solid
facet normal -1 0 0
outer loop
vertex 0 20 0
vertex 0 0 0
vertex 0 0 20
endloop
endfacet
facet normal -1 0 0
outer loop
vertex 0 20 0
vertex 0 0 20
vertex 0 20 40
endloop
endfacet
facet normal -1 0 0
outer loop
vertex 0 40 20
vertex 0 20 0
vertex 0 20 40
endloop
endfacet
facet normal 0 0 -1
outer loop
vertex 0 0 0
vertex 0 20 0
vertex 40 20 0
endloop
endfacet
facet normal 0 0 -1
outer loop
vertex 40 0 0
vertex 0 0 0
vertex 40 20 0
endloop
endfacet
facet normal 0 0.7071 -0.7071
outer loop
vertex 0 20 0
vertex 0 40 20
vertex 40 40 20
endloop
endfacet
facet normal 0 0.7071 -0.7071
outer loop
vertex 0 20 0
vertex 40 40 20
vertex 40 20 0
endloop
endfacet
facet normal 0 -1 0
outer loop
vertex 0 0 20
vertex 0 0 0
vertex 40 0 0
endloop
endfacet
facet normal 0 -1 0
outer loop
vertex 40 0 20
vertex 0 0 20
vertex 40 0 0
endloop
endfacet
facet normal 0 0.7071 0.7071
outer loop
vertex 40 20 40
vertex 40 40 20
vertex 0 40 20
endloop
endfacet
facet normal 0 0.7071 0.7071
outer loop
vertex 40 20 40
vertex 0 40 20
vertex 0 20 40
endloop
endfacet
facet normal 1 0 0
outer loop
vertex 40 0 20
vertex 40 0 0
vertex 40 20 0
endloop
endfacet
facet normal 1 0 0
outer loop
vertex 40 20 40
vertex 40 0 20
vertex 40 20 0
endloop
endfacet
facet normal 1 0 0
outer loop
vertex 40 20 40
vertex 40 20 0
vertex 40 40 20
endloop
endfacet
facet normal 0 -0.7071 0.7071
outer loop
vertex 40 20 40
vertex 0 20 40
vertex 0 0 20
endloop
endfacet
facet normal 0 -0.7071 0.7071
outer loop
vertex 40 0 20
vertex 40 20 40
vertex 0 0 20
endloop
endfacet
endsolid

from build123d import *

# Parameters (mm, degrees)
SKETCH1_W           = 40
SKETCH1_H           = 40
BOSS_EXTRUDE1_DEPTH = 40
CUT_EXTRUDE1_DEPTH  = 40
CUT_EXTRUDE2_DEPTH  = 40


with BuildPart() as part:
    # Sketch1 → Boss-Extrude1 (new body)
    with BuildSketch(Plane.XY):
        with Locations((20, 20)):
            Rectangle(SKETCH1_W, SKETCH1_H)
    extrude(amount=BOSS_EXTRUDE1_DEPTH)

    # Sketch2 → Cut-Extrude1 (cut)
    with BuildSketch(Plane.ZY):
        Polygon((20, 40), (40, 20), (40, 40), align=None)
        Polygon((40, 20), (20, 0), (40, 0), align=None)
    extrude(amount=-CUT_EXTRUDE1_DEPTH, mode=Mode.SUBTRACT)

    # Sketch3 → Cut-Extrude2 (cut)
    with BuildSketch(Plane(origin=(0, 0, 0), x_dir=(0, 0, -1), z_dir=(1, 0, 0))):
        Polygon((-20, 40), (0, 20), (0, 40), align=None)
    extrude(amount=CUT_EXTRUDE2_DEPTH, mode=Mode.SUBTRACT)


solid = part.part
